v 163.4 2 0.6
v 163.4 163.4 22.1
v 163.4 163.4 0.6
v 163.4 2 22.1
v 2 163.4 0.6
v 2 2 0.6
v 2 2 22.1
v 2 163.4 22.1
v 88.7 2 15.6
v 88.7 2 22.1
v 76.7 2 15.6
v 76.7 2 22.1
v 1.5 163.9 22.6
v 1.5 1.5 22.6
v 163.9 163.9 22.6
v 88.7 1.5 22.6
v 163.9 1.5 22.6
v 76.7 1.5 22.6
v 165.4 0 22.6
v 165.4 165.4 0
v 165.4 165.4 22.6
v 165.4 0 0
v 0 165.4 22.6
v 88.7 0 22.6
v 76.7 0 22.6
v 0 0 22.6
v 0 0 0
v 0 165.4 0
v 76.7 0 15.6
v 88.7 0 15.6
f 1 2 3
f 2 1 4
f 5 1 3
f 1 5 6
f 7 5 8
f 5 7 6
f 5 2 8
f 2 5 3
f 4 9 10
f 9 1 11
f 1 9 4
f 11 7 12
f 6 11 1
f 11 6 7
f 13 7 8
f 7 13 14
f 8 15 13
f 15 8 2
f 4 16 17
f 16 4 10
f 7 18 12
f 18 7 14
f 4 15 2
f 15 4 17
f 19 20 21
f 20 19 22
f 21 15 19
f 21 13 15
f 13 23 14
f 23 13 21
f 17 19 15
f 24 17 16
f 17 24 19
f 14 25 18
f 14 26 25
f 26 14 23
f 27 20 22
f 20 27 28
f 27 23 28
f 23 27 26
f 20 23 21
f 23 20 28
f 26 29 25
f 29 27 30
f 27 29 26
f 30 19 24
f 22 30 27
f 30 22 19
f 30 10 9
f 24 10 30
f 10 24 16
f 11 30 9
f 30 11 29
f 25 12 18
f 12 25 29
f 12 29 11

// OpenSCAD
// Front / outer cap with a centred USB notch and a tighter slip fit.
// All dimensions are in millimetres.

rear_outer_size = 161;
clearance_per_side = 0.2;
cap_plate_thickness = 0.6;
cap_wall_thickness = 2;
cap_skirt_depth = 22;
entry_chamfer = 0.5;

cap_inner_size = rear_outer_size + 2 * clearance_per_side; // 161.4 mm
cap_outer_size = cap_inner_size + 2 * cap_wall_thickness;   // 165.4 mm
cap_height = cap_plate_thickness + cap_skirt_depth;         // 22.6 mm

usb_width = 12;
usb_depth = 7;
usb_center_x = cap_outer_size / 2; // 82.7 mm in this part

module cap_cavity_with_entry_chamfer() {
    union() {
        // Main straight cavity.
        translate([
            cap_wall_thickness,
            cap_wall_thickness,
            cap_plate_thickness
        ])
            cube([
                cap_inner_size,
                cap_inner_size,
                cap_skirt_depth - entry_chamfer + 0.01
            ]);

        // 0.5 mm lead-in chamfer at the open edge.
        hull() {
            translate([
                cap_wall_thickness,
                cap_wall_thickness,
                cap_height - entry_chamfer
            ])
                cube([cap_inner_size, cap_inner_size, 0.01]);

            translate([
                cap_wall_thickness - entry_chamfer,
                cap_wall_thickness - entry_chamfer,
                cap_height
            ])
                cube([
                    cap_inner_size + 2 * entry_chamfer,
                    cap_inner_size + 2 * entry_chamfer,
                    0.01
                ]);
        }
    }
}

difference() {
    cube([cap_outer_size, cap_outer_size, cap_height]);
    cap_cavity_with_entry_chamfer();

    // Matching U-shaped USB opening on the bottom/front wall.
    translate([
        usb_center_x - usb_width / 2,
        -0.1,
        cap_height - usb_depth
    ])
        cube([usb_width, cap_wall_thickness + 0.2, usb_depth + 0.1]);
}
